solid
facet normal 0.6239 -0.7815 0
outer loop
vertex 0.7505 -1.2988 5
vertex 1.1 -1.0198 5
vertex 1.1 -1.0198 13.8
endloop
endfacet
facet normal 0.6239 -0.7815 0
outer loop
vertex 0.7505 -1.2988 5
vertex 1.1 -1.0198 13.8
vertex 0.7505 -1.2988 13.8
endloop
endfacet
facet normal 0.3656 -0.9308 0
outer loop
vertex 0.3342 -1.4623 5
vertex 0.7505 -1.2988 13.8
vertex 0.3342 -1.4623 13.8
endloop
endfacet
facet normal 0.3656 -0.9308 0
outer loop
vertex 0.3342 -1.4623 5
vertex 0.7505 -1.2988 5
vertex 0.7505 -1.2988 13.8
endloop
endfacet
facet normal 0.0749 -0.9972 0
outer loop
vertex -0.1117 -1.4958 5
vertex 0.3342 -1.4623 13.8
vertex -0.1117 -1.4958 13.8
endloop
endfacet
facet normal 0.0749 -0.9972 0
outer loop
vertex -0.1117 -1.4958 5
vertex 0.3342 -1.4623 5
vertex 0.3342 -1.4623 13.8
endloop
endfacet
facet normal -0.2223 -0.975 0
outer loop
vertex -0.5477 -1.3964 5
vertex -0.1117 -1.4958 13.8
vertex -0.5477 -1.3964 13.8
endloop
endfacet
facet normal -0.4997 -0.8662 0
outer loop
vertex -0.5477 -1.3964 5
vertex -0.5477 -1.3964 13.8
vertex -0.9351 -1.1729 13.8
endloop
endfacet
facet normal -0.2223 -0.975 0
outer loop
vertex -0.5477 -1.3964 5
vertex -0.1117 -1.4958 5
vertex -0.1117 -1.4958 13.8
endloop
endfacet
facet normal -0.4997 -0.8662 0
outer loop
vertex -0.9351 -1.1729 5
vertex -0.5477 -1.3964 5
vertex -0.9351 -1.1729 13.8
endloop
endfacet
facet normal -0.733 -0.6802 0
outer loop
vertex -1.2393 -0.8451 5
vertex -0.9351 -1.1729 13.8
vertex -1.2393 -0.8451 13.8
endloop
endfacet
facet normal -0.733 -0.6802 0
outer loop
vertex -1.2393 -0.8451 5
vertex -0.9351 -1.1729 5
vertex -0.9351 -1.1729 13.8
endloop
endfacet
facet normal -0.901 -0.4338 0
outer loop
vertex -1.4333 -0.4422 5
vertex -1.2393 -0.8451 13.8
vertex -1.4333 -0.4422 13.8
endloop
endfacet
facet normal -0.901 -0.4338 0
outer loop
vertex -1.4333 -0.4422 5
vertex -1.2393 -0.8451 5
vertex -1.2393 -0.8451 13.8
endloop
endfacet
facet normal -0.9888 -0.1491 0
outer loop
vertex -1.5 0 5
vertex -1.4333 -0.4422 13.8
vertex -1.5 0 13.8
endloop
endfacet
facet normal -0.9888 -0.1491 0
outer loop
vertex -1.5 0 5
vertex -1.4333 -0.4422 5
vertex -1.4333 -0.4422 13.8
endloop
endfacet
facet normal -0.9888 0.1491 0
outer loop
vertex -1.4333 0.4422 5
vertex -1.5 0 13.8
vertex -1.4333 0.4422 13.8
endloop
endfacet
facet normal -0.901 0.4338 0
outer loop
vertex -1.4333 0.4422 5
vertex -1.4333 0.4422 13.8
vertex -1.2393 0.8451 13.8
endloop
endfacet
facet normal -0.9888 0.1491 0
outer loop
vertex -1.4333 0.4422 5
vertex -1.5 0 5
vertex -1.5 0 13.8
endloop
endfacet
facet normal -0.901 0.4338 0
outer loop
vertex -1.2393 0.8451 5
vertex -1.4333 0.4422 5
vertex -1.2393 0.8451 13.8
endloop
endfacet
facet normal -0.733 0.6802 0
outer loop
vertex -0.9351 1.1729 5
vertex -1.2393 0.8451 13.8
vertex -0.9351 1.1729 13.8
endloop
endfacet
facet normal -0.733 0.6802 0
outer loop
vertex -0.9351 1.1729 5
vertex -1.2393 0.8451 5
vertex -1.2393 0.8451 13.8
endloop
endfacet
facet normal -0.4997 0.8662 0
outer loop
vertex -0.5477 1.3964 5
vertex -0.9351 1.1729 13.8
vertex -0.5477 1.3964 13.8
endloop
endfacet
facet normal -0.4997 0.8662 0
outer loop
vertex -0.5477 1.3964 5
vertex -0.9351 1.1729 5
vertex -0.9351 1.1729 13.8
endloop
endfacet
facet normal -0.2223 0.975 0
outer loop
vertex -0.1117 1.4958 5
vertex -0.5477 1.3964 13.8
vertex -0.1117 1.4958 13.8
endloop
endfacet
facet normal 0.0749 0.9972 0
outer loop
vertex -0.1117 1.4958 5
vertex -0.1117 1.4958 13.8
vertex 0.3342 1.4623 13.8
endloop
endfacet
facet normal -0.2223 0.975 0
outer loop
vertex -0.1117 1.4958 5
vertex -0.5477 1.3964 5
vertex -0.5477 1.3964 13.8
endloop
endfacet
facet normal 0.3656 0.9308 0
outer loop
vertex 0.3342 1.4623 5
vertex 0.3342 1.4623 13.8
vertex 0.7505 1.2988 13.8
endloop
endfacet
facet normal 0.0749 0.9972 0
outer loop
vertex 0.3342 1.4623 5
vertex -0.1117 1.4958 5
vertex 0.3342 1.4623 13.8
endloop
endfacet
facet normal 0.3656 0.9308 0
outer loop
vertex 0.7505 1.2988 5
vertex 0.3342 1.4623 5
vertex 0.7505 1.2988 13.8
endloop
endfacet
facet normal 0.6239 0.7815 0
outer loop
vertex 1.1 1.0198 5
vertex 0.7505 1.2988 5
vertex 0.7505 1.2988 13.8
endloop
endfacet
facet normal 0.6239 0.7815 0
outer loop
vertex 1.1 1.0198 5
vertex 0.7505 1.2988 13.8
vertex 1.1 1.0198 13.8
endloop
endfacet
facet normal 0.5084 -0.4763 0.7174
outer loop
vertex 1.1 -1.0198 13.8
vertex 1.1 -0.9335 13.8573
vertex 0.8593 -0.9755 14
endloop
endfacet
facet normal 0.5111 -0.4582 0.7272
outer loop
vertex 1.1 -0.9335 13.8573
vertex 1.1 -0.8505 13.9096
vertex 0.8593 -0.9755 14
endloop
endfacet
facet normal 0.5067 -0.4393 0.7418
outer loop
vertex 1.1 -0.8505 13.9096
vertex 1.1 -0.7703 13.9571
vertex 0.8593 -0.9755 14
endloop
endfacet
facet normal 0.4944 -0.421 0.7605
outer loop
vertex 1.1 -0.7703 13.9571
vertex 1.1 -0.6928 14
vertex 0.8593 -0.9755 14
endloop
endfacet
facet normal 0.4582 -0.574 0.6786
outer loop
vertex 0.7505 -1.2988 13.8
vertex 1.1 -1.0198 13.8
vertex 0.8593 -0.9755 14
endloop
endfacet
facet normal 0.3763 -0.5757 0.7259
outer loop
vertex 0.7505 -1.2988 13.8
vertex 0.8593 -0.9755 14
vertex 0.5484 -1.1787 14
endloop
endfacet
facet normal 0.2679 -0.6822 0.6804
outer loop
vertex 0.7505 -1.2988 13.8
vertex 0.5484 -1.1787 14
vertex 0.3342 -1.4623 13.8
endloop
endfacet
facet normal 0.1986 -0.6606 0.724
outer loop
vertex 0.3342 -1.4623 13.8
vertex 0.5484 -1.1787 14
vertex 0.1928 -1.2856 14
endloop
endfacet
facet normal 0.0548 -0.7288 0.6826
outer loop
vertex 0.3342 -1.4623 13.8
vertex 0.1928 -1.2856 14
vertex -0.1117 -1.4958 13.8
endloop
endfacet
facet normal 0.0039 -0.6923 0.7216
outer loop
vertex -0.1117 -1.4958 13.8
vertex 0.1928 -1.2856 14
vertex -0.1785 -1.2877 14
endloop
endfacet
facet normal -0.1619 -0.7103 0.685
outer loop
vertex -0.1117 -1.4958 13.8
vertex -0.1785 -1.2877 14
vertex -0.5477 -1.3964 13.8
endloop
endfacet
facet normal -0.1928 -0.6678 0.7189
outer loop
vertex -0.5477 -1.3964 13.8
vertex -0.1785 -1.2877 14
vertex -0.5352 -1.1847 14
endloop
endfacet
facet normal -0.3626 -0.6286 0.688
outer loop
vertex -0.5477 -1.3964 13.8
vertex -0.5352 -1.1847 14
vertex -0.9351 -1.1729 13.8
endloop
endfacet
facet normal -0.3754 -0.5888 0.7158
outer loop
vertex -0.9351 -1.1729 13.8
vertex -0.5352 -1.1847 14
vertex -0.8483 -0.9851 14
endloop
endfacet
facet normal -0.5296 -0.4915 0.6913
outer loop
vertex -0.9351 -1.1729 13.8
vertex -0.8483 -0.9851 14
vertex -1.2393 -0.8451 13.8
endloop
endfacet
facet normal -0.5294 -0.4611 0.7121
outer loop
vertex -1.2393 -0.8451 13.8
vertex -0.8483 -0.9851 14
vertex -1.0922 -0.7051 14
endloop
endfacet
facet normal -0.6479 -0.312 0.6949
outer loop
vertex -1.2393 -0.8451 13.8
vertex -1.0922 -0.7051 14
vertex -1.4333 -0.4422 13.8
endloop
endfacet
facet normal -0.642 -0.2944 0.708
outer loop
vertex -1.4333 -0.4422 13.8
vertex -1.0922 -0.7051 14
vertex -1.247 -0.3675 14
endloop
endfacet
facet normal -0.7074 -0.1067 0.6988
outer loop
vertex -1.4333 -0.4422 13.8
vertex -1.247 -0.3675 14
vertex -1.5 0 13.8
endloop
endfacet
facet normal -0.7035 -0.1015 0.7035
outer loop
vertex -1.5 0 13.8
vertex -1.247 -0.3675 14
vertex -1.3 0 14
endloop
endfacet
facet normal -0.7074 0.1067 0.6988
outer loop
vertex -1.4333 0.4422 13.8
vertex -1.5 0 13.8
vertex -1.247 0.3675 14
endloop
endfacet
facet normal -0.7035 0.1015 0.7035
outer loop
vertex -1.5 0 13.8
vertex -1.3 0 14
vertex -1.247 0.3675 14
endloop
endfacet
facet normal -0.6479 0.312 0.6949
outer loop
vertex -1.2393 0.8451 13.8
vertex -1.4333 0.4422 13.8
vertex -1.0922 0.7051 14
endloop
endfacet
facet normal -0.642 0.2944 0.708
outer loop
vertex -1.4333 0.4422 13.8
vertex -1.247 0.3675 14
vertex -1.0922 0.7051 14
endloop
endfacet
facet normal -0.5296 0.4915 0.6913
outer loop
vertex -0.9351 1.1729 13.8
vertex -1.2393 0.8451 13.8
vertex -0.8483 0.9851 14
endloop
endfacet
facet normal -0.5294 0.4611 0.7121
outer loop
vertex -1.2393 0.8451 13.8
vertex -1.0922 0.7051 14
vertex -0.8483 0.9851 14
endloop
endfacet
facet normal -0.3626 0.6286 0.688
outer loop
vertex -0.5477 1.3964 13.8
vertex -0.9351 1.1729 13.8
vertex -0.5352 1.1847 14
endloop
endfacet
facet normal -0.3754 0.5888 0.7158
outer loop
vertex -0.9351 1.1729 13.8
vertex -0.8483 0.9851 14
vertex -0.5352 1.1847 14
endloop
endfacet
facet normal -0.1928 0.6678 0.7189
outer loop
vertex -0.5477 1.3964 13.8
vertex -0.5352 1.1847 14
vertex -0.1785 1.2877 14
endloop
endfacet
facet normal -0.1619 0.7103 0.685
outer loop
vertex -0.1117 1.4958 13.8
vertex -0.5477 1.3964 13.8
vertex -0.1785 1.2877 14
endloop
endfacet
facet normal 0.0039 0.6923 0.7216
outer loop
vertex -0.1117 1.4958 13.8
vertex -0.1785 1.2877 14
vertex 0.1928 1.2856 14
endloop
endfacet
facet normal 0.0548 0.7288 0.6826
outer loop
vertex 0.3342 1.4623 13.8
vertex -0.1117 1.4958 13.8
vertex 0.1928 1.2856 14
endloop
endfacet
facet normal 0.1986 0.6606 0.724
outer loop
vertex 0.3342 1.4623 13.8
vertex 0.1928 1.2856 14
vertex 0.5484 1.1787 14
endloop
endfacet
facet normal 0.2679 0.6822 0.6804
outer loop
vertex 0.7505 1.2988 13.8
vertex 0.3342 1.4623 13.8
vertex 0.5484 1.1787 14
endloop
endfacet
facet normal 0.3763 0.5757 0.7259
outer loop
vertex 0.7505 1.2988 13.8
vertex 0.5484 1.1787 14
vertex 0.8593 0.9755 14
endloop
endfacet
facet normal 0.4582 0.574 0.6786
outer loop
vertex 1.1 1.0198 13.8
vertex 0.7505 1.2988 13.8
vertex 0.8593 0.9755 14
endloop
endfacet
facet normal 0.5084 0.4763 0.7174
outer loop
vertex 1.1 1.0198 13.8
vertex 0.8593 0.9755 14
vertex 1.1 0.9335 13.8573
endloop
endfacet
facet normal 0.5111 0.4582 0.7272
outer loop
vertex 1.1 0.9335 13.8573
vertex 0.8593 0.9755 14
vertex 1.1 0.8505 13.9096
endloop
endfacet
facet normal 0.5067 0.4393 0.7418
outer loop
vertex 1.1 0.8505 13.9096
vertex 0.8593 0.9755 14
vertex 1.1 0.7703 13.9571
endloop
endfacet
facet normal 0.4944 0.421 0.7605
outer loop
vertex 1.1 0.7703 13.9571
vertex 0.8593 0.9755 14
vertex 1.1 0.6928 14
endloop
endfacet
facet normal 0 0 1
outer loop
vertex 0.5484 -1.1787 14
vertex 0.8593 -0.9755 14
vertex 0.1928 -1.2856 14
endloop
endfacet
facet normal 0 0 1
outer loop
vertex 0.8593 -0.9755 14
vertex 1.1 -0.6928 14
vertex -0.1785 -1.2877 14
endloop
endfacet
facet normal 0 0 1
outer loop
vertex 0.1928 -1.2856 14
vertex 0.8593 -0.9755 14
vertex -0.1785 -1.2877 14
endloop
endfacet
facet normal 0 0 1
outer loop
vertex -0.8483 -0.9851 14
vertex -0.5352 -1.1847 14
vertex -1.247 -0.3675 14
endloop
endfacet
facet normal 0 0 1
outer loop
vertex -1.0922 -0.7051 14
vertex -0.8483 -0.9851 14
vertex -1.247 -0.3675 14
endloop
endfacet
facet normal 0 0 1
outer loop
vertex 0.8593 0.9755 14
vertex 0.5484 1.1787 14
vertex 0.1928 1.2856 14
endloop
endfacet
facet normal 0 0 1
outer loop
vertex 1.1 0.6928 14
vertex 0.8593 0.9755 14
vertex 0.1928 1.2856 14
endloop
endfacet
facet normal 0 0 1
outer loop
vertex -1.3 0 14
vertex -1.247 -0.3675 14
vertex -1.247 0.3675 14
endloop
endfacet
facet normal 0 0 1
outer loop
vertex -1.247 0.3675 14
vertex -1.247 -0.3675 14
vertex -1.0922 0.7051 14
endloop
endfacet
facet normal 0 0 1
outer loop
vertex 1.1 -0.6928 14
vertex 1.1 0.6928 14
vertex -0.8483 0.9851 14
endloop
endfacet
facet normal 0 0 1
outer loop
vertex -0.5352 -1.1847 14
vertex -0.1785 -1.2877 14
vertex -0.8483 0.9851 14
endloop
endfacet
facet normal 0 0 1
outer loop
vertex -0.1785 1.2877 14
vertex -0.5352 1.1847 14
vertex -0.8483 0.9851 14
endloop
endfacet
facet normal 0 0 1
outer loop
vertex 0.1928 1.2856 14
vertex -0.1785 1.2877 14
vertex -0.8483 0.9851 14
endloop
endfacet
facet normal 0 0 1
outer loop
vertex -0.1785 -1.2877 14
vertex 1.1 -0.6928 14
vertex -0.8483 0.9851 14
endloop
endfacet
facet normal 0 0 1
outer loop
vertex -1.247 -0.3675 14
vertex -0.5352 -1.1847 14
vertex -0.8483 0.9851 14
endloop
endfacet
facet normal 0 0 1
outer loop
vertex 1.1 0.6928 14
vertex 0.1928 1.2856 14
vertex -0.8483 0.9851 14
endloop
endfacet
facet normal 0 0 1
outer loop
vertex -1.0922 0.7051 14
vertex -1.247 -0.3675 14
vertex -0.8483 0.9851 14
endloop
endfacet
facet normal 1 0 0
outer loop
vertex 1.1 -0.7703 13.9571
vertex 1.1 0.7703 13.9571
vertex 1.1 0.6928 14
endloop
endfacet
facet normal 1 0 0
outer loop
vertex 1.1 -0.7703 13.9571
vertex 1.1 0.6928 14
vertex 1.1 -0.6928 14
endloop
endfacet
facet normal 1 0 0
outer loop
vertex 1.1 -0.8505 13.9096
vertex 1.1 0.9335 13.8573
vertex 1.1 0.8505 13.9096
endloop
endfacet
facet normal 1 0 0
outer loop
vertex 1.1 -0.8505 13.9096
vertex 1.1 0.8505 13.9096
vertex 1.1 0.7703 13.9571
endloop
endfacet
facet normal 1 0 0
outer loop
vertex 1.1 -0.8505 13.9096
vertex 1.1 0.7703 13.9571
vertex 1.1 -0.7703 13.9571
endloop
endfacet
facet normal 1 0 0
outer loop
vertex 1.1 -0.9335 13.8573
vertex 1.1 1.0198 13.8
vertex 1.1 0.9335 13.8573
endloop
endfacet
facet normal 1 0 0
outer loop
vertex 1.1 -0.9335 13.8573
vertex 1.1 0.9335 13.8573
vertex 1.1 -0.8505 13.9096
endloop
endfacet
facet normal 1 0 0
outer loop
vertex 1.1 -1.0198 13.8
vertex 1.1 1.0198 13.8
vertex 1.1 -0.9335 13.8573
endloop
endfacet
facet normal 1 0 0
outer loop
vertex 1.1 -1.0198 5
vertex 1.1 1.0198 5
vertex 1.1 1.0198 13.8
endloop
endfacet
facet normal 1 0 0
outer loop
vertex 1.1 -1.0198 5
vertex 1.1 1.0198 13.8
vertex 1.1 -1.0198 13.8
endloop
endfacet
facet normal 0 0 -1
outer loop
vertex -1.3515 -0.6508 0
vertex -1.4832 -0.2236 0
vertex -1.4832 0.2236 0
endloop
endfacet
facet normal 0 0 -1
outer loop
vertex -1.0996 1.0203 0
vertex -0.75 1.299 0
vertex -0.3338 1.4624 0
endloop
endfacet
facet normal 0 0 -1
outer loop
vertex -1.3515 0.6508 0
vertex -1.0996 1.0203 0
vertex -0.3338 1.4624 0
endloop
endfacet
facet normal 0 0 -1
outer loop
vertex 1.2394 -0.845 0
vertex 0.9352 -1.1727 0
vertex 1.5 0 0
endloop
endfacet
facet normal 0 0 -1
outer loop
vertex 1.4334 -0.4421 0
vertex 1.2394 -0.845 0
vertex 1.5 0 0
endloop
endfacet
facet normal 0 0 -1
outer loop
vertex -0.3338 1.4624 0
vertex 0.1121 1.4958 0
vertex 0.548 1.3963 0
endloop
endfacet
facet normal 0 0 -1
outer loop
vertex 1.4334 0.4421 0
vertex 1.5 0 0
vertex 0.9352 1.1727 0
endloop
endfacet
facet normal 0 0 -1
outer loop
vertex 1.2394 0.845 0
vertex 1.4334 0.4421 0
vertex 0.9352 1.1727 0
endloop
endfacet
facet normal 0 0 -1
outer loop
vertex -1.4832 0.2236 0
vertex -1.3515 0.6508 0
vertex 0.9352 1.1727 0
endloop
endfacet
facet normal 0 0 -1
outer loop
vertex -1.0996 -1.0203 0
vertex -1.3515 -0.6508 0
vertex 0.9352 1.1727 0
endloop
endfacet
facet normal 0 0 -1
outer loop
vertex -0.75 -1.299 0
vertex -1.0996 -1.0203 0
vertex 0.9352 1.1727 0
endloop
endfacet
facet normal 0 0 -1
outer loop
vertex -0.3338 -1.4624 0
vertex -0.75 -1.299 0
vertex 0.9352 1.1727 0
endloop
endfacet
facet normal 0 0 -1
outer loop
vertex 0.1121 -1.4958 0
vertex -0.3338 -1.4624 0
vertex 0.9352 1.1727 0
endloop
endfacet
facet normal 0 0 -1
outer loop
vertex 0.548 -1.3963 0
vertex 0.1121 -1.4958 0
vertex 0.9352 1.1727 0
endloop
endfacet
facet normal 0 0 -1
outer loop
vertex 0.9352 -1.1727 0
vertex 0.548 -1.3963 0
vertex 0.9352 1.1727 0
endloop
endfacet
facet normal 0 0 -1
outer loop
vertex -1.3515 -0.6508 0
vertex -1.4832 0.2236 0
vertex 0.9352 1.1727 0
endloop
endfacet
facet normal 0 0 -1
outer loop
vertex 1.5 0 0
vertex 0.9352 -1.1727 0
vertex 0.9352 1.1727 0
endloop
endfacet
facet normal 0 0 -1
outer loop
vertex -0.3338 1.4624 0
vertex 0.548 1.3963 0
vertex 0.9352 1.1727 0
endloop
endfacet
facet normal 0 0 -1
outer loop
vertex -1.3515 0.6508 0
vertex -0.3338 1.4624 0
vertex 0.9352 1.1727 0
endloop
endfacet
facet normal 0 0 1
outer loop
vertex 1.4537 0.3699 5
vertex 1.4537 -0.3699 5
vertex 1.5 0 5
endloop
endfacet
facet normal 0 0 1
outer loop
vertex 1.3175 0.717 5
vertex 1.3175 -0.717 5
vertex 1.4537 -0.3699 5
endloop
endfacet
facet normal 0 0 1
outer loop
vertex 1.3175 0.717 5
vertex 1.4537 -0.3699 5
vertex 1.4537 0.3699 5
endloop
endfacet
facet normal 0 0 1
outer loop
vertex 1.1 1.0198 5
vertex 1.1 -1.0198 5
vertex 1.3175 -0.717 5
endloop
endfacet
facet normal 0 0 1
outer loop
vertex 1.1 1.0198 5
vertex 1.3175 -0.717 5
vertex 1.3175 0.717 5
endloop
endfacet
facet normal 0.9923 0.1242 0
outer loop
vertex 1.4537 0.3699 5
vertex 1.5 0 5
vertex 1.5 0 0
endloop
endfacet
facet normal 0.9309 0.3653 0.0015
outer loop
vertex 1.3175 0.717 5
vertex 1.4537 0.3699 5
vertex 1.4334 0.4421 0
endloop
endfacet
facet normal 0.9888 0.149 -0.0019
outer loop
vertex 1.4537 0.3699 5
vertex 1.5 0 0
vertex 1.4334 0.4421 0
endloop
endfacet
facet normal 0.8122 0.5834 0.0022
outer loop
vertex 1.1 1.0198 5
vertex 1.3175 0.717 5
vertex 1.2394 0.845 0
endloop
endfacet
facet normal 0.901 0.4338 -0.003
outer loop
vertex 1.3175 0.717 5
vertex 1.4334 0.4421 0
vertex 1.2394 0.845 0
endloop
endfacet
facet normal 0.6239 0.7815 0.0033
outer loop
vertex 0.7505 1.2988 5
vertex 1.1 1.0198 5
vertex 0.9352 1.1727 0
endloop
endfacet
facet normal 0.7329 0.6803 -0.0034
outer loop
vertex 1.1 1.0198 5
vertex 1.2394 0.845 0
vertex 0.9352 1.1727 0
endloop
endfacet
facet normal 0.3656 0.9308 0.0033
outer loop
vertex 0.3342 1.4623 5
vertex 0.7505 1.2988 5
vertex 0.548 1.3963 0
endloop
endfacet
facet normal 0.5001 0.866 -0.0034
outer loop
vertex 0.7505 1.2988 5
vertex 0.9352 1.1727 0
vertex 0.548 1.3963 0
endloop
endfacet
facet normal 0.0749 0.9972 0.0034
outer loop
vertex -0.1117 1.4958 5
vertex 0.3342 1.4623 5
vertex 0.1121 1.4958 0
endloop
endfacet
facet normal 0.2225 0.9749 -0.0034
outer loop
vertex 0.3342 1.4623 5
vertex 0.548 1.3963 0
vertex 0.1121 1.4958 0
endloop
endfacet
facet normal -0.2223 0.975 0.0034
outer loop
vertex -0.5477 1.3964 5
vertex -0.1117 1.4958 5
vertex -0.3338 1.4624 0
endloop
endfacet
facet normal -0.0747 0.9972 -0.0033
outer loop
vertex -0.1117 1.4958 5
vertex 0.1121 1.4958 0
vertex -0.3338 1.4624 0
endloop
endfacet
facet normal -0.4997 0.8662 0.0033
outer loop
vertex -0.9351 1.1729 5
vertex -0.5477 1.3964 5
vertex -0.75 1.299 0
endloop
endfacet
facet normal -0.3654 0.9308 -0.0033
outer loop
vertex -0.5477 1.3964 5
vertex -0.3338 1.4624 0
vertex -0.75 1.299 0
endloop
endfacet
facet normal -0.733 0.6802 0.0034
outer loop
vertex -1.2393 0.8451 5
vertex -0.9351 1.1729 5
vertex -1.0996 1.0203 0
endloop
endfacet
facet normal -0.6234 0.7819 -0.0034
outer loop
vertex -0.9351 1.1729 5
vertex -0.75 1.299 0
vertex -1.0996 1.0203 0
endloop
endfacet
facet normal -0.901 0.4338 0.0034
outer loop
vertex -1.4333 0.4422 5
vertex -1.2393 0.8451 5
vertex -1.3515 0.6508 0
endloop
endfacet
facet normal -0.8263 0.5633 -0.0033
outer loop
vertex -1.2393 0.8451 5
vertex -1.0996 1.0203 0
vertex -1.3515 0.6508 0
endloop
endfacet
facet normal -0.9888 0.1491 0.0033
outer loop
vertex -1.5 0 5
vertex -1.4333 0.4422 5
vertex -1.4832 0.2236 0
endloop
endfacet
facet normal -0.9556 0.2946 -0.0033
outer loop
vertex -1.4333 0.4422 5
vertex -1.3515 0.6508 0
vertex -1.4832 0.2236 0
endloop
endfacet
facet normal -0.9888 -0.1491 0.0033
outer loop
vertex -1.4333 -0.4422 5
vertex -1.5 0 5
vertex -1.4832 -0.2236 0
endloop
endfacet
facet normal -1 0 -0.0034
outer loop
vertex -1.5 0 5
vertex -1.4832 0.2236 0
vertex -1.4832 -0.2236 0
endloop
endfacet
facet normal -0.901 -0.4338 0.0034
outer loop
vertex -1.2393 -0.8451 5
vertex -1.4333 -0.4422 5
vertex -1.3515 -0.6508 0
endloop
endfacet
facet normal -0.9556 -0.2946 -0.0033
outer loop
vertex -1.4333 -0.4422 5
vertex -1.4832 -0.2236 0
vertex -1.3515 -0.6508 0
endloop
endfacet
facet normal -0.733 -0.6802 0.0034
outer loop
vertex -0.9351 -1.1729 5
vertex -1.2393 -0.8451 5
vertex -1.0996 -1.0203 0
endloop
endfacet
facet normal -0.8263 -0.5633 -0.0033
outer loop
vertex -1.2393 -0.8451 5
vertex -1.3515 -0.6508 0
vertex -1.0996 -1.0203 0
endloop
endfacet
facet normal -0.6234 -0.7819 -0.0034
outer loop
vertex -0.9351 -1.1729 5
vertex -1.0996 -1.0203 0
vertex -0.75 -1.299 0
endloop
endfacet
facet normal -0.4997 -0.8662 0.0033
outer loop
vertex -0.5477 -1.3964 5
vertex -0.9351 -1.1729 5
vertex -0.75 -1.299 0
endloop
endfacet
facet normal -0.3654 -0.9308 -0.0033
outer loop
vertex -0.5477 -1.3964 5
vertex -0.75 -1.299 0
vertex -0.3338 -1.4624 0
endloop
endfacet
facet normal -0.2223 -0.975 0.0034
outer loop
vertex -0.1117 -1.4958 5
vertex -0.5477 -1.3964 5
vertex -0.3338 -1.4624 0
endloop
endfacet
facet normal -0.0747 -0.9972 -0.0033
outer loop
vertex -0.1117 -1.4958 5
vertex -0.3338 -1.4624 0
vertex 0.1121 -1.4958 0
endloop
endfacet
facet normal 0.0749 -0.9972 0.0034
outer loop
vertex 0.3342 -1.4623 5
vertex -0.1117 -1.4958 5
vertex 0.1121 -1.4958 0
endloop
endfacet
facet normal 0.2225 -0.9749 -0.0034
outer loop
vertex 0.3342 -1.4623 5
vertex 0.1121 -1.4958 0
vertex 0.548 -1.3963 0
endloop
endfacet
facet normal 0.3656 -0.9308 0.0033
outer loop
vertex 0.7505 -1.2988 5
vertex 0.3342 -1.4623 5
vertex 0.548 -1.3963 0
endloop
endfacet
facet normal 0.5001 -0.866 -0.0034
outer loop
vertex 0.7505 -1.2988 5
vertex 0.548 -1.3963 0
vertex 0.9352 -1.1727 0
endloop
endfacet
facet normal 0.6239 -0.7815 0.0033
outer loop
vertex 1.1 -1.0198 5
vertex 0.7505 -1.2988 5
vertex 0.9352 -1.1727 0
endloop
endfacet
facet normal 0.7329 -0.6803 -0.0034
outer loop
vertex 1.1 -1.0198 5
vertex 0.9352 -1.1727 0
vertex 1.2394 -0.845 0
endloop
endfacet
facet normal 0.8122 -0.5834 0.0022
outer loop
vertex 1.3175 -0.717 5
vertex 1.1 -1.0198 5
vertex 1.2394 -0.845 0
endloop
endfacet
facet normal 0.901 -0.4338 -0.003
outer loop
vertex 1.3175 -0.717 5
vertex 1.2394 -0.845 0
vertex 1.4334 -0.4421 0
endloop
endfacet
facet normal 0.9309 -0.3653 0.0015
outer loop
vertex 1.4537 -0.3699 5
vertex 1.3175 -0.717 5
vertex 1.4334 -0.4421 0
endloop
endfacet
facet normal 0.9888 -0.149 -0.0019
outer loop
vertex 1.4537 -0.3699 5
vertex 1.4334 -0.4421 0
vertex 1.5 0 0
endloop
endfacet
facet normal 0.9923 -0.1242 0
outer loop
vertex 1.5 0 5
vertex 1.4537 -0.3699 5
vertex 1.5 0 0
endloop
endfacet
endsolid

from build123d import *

# Parameters (mm, degrees)
SKETCH_1_R      = 1.5
EXTRUDE_1_DEPTH = 5
EXTRUDE_2_DEPTH = 9
CHAMFER_1_SIZE  = 0.2


with BuildPart() as part:
    # Эскиз1 → Бобышка-Вытянуть1 (new body)
    with BuildSketch(Plane.XY):
        Circle(SKETCH_1_R)
    extrude(amount=EXTRUDE_1_DEPTH)

    # Эскиз2 → Бобышка-Вытянуть2 (add)
    with BuildSketch(Plane.XY.offset(5)):
        with BuildLine():
            Line((1.1, 1.019803903), (1.1, -1.019803903))
            ThreePointArc((1.1, -1.019803903), (-1.5, 0), (1.1, 1.019803903))
        make_face()
    extrude(amount=EXTRUDE_2_DEPTH)

    # Фаска1
    chamfer_1_edges = [part.edges().sort_by_distance(p)[0] for p in [
        (-1.5, 0, 14),
    ]]
    chamfer(chamfer_1_edges, length=CHAMFER_1_SIZE)


solid = part.part
